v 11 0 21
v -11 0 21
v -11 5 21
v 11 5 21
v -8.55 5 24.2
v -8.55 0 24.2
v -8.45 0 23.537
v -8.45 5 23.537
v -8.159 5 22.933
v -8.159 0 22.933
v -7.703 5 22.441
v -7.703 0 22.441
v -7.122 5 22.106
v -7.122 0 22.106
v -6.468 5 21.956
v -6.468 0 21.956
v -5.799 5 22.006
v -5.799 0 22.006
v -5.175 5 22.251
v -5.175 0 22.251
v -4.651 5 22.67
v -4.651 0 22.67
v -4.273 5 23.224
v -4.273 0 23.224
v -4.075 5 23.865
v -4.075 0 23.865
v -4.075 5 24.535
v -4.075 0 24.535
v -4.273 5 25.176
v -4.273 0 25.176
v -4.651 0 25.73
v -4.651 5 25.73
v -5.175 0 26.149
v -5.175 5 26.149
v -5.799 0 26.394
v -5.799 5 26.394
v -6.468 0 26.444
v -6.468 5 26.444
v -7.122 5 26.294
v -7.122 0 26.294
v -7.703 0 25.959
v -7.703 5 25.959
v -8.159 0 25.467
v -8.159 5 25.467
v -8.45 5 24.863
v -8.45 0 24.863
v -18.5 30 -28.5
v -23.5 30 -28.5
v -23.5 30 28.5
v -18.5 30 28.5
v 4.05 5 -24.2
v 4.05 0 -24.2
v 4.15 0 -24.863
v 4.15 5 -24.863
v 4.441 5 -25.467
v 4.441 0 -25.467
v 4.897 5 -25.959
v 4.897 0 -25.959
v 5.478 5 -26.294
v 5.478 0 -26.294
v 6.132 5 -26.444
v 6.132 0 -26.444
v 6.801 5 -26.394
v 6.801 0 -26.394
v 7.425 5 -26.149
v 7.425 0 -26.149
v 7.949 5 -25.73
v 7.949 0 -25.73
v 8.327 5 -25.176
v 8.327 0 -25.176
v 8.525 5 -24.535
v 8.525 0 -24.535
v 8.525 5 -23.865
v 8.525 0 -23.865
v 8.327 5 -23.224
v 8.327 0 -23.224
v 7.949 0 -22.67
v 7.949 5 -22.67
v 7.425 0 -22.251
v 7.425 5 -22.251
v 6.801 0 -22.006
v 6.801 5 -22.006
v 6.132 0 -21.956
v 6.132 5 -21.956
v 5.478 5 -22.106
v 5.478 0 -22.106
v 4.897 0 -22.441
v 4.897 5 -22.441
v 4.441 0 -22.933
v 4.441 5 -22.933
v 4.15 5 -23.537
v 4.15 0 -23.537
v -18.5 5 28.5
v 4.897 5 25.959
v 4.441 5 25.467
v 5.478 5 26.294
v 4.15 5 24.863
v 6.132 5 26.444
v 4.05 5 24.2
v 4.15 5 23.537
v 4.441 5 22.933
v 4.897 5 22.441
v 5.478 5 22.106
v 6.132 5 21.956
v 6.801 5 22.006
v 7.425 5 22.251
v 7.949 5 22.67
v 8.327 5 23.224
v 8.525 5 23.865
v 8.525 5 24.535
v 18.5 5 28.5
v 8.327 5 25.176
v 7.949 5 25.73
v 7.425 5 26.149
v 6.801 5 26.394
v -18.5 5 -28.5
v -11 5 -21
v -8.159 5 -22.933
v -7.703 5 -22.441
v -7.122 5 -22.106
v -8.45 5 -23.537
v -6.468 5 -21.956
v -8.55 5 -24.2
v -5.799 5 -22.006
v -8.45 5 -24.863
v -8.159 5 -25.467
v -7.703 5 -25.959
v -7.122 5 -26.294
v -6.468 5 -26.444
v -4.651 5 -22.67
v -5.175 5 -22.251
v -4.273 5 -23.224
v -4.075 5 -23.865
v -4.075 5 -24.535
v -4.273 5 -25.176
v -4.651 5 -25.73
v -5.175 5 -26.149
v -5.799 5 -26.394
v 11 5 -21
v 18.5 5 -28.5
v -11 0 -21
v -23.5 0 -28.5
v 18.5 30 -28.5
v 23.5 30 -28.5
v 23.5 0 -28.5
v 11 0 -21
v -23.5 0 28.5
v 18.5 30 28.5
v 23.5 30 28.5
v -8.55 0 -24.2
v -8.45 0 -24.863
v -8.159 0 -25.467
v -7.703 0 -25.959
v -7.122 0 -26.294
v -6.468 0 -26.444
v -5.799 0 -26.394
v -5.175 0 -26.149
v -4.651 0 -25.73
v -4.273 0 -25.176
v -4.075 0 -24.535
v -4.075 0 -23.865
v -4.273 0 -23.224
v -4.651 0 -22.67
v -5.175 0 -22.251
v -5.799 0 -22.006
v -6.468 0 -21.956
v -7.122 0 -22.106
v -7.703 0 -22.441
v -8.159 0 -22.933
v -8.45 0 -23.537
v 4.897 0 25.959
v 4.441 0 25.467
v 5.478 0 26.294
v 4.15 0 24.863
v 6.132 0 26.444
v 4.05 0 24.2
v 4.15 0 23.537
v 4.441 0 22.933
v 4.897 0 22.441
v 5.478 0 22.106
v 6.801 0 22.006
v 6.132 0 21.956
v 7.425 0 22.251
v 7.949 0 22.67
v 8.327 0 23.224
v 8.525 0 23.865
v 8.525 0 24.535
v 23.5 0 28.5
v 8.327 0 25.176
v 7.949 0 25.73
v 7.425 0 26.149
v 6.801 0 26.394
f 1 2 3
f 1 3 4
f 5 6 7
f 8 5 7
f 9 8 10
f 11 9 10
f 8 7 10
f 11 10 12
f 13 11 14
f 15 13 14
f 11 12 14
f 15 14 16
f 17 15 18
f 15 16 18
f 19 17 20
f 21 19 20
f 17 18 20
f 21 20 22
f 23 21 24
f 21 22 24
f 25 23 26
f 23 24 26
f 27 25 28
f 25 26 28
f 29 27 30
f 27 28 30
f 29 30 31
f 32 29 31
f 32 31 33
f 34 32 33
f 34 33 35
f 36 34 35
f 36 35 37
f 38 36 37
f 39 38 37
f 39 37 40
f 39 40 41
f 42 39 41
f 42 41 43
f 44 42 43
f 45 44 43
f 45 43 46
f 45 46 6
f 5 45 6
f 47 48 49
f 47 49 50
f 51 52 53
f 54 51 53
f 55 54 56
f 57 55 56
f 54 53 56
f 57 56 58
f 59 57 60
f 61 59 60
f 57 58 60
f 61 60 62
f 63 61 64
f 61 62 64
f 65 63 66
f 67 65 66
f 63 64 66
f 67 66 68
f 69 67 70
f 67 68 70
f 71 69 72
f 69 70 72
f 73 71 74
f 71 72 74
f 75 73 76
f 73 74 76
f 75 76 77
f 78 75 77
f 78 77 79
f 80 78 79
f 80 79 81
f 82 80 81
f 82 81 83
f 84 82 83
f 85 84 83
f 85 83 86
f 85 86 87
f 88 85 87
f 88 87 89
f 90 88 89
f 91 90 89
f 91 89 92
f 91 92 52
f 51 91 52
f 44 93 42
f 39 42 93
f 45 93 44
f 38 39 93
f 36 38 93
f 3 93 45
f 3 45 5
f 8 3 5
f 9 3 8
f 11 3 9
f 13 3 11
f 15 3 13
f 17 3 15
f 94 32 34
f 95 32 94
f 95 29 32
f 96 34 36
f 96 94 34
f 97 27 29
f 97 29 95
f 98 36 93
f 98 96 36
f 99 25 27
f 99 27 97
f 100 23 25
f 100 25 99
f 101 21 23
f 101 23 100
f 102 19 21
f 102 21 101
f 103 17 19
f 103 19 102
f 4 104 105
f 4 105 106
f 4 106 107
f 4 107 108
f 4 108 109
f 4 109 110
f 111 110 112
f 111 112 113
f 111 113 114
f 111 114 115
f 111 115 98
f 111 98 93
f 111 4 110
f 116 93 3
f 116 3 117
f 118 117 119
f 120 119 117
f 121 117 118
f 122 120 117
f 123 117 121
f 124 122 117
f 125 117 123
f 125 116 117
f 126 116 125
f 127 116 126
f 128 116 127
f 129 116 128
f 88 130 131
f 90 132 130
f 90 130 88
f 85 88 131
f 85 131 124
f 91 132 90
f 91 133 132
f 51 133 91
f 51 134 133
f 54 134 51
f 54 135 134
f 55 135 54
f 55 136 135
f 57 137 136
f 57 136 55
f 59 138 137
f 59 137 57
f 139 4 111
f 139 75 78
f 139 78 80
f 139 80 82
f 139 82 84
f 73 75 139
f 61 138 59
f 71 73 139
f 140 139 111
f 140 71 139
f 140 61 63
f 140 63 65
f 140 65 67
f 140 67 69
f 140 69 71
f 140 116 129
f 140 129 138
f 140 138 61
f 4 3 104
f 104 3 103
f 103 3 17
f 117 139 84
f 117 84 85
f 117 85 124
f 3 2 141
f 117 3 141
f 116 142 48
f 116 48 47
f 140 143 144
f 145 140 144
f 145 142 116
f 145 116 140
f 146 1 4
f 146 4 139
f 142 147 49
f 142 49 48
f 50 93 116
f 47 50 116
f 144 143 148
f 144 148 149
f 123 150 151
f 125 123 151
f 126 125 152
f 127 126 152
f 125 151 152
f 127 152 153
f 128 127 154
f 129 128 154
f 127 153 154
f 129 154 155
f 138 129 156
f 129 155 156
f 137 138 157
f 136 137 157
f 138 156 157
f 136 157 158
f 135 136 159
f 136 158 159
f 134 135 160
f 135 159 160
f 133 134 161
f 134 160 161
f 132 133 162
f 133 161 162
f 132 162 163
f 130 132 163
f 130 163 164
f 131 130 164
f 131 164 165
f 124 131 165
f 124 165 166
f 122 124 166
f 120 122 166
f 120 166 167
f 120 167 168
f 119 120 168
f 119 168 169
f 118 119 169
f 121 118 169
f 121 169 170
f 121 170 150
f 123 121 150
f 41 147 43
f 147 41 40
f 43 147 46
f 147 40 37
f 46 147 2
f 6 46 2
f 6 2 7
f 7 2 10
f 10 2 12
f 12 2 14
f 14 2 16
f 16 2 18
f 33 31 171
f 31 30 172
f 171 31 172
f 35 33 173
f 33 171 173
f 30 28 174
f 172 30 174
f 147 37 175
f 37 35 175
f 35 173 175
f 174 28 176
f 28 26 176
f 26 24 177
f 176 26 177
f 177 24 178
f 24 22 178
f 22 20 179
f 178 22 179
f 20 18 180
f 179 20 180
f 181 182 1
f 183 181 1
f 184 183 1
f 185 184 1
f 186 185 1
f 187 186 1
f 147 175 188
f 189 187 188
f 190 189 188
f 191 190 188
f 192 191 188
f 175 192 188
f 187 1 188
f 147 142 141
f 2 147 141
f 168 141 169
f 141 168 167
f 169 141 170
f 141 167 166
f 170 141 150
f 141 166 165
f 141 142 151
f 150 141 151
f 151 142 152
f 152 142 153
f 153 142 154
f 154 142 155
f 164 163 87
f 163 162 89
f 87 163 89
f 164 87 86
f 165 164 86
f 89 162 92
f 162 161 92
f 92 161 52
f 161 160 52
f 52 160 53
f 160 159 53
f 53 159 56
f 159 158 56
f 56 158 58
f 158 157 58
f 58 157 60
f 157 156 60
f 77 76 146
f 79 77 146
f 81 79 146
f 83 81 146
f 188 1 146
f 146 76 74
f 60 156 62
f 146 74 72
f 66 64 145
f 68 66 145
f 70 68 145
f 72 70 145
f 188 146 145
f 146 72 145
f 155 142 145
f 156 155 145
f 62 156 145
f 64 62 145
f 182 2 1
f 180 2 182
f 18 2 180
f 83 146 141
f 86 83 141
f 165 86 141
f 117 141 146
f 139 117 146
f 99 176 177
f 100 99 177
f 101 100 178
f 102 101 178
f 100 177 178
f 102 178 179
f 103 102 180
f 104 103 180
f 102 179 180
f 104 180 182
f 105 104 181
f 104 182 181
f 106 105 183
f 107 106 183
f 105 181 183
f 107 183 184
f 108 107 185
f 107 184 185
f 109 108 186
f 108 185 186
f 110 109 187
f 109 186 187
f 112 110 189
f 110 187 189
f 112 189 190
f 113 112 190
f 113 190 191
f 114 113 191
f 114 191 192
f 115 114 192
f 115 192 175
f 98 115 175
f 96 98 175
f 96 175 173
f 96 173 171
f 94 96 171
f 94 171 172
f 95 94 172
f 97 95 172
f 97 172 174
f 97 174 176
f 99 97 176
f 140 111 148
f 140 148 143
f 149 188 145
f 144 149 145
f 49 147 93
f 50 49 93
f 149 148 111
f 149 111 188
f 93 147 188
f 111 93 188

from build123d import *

# Parameters (mm, degrees)
SKETCH1_W            = 37
SKETCH1_H            = 57
SKETCH1_W_2          = 22
SKETCH1_H_2          = 42
BOSS_EXTRUDE1_DEPTH  = 5
M4_CLEARANCE_HOLE1_D = 4.5
SKETCH4_W            = 5
SKETCH4_H            = 57
BOSS_EXTRUDE2_DEPTH  = 30


with BuildPart() as part:
    # Sketch1 → Boss-Extrude1 (new body)
    with BuildSketch(Plane(origin=(0, 0, 0), x_dir=(1, 0, 0), z_dir=(0, 1, 0))):
        Rectangle(SKETCH1_W, SKETCH1_H)
        Rectangle(SKETCH1_W_2, SKETCH1_H_2, mode=Mode.SUBTRACT)
    extrude(amount=BOSS_EXTRUDE1_DEPTH)

    # M4 Clearance Hole1 (through all)
    with Locations(Plane(origin=(0, 5, 0), x_dir=(1, 0, 0), z_dir=(0, 1, 0))):
        with Locations((-6.3, 24.2), (6.3, 24.2), (-6.3, -24.2), (6.3, -24.2)):
            Hole(M4_CLEARANCE_HOLE1_D / 2)

    # Sketch4 → Boss-Extrude2 (add)
    with BuildSketch(Plane(origin=(0, 0, 0), x_dir=(1, 0, 0), z_dir=(0, 1, 0))):
        with Locations((-21, 0)):
            Rectangle(SKETCH4_W, SKETCH4_H)
        with Locations((21, 0)):
            Rectangle(SKETCH4_W, SKETCH4_H)
    extrude(amount=BOSS_EXTRUDE2_DEPTH)


solid = part.part
